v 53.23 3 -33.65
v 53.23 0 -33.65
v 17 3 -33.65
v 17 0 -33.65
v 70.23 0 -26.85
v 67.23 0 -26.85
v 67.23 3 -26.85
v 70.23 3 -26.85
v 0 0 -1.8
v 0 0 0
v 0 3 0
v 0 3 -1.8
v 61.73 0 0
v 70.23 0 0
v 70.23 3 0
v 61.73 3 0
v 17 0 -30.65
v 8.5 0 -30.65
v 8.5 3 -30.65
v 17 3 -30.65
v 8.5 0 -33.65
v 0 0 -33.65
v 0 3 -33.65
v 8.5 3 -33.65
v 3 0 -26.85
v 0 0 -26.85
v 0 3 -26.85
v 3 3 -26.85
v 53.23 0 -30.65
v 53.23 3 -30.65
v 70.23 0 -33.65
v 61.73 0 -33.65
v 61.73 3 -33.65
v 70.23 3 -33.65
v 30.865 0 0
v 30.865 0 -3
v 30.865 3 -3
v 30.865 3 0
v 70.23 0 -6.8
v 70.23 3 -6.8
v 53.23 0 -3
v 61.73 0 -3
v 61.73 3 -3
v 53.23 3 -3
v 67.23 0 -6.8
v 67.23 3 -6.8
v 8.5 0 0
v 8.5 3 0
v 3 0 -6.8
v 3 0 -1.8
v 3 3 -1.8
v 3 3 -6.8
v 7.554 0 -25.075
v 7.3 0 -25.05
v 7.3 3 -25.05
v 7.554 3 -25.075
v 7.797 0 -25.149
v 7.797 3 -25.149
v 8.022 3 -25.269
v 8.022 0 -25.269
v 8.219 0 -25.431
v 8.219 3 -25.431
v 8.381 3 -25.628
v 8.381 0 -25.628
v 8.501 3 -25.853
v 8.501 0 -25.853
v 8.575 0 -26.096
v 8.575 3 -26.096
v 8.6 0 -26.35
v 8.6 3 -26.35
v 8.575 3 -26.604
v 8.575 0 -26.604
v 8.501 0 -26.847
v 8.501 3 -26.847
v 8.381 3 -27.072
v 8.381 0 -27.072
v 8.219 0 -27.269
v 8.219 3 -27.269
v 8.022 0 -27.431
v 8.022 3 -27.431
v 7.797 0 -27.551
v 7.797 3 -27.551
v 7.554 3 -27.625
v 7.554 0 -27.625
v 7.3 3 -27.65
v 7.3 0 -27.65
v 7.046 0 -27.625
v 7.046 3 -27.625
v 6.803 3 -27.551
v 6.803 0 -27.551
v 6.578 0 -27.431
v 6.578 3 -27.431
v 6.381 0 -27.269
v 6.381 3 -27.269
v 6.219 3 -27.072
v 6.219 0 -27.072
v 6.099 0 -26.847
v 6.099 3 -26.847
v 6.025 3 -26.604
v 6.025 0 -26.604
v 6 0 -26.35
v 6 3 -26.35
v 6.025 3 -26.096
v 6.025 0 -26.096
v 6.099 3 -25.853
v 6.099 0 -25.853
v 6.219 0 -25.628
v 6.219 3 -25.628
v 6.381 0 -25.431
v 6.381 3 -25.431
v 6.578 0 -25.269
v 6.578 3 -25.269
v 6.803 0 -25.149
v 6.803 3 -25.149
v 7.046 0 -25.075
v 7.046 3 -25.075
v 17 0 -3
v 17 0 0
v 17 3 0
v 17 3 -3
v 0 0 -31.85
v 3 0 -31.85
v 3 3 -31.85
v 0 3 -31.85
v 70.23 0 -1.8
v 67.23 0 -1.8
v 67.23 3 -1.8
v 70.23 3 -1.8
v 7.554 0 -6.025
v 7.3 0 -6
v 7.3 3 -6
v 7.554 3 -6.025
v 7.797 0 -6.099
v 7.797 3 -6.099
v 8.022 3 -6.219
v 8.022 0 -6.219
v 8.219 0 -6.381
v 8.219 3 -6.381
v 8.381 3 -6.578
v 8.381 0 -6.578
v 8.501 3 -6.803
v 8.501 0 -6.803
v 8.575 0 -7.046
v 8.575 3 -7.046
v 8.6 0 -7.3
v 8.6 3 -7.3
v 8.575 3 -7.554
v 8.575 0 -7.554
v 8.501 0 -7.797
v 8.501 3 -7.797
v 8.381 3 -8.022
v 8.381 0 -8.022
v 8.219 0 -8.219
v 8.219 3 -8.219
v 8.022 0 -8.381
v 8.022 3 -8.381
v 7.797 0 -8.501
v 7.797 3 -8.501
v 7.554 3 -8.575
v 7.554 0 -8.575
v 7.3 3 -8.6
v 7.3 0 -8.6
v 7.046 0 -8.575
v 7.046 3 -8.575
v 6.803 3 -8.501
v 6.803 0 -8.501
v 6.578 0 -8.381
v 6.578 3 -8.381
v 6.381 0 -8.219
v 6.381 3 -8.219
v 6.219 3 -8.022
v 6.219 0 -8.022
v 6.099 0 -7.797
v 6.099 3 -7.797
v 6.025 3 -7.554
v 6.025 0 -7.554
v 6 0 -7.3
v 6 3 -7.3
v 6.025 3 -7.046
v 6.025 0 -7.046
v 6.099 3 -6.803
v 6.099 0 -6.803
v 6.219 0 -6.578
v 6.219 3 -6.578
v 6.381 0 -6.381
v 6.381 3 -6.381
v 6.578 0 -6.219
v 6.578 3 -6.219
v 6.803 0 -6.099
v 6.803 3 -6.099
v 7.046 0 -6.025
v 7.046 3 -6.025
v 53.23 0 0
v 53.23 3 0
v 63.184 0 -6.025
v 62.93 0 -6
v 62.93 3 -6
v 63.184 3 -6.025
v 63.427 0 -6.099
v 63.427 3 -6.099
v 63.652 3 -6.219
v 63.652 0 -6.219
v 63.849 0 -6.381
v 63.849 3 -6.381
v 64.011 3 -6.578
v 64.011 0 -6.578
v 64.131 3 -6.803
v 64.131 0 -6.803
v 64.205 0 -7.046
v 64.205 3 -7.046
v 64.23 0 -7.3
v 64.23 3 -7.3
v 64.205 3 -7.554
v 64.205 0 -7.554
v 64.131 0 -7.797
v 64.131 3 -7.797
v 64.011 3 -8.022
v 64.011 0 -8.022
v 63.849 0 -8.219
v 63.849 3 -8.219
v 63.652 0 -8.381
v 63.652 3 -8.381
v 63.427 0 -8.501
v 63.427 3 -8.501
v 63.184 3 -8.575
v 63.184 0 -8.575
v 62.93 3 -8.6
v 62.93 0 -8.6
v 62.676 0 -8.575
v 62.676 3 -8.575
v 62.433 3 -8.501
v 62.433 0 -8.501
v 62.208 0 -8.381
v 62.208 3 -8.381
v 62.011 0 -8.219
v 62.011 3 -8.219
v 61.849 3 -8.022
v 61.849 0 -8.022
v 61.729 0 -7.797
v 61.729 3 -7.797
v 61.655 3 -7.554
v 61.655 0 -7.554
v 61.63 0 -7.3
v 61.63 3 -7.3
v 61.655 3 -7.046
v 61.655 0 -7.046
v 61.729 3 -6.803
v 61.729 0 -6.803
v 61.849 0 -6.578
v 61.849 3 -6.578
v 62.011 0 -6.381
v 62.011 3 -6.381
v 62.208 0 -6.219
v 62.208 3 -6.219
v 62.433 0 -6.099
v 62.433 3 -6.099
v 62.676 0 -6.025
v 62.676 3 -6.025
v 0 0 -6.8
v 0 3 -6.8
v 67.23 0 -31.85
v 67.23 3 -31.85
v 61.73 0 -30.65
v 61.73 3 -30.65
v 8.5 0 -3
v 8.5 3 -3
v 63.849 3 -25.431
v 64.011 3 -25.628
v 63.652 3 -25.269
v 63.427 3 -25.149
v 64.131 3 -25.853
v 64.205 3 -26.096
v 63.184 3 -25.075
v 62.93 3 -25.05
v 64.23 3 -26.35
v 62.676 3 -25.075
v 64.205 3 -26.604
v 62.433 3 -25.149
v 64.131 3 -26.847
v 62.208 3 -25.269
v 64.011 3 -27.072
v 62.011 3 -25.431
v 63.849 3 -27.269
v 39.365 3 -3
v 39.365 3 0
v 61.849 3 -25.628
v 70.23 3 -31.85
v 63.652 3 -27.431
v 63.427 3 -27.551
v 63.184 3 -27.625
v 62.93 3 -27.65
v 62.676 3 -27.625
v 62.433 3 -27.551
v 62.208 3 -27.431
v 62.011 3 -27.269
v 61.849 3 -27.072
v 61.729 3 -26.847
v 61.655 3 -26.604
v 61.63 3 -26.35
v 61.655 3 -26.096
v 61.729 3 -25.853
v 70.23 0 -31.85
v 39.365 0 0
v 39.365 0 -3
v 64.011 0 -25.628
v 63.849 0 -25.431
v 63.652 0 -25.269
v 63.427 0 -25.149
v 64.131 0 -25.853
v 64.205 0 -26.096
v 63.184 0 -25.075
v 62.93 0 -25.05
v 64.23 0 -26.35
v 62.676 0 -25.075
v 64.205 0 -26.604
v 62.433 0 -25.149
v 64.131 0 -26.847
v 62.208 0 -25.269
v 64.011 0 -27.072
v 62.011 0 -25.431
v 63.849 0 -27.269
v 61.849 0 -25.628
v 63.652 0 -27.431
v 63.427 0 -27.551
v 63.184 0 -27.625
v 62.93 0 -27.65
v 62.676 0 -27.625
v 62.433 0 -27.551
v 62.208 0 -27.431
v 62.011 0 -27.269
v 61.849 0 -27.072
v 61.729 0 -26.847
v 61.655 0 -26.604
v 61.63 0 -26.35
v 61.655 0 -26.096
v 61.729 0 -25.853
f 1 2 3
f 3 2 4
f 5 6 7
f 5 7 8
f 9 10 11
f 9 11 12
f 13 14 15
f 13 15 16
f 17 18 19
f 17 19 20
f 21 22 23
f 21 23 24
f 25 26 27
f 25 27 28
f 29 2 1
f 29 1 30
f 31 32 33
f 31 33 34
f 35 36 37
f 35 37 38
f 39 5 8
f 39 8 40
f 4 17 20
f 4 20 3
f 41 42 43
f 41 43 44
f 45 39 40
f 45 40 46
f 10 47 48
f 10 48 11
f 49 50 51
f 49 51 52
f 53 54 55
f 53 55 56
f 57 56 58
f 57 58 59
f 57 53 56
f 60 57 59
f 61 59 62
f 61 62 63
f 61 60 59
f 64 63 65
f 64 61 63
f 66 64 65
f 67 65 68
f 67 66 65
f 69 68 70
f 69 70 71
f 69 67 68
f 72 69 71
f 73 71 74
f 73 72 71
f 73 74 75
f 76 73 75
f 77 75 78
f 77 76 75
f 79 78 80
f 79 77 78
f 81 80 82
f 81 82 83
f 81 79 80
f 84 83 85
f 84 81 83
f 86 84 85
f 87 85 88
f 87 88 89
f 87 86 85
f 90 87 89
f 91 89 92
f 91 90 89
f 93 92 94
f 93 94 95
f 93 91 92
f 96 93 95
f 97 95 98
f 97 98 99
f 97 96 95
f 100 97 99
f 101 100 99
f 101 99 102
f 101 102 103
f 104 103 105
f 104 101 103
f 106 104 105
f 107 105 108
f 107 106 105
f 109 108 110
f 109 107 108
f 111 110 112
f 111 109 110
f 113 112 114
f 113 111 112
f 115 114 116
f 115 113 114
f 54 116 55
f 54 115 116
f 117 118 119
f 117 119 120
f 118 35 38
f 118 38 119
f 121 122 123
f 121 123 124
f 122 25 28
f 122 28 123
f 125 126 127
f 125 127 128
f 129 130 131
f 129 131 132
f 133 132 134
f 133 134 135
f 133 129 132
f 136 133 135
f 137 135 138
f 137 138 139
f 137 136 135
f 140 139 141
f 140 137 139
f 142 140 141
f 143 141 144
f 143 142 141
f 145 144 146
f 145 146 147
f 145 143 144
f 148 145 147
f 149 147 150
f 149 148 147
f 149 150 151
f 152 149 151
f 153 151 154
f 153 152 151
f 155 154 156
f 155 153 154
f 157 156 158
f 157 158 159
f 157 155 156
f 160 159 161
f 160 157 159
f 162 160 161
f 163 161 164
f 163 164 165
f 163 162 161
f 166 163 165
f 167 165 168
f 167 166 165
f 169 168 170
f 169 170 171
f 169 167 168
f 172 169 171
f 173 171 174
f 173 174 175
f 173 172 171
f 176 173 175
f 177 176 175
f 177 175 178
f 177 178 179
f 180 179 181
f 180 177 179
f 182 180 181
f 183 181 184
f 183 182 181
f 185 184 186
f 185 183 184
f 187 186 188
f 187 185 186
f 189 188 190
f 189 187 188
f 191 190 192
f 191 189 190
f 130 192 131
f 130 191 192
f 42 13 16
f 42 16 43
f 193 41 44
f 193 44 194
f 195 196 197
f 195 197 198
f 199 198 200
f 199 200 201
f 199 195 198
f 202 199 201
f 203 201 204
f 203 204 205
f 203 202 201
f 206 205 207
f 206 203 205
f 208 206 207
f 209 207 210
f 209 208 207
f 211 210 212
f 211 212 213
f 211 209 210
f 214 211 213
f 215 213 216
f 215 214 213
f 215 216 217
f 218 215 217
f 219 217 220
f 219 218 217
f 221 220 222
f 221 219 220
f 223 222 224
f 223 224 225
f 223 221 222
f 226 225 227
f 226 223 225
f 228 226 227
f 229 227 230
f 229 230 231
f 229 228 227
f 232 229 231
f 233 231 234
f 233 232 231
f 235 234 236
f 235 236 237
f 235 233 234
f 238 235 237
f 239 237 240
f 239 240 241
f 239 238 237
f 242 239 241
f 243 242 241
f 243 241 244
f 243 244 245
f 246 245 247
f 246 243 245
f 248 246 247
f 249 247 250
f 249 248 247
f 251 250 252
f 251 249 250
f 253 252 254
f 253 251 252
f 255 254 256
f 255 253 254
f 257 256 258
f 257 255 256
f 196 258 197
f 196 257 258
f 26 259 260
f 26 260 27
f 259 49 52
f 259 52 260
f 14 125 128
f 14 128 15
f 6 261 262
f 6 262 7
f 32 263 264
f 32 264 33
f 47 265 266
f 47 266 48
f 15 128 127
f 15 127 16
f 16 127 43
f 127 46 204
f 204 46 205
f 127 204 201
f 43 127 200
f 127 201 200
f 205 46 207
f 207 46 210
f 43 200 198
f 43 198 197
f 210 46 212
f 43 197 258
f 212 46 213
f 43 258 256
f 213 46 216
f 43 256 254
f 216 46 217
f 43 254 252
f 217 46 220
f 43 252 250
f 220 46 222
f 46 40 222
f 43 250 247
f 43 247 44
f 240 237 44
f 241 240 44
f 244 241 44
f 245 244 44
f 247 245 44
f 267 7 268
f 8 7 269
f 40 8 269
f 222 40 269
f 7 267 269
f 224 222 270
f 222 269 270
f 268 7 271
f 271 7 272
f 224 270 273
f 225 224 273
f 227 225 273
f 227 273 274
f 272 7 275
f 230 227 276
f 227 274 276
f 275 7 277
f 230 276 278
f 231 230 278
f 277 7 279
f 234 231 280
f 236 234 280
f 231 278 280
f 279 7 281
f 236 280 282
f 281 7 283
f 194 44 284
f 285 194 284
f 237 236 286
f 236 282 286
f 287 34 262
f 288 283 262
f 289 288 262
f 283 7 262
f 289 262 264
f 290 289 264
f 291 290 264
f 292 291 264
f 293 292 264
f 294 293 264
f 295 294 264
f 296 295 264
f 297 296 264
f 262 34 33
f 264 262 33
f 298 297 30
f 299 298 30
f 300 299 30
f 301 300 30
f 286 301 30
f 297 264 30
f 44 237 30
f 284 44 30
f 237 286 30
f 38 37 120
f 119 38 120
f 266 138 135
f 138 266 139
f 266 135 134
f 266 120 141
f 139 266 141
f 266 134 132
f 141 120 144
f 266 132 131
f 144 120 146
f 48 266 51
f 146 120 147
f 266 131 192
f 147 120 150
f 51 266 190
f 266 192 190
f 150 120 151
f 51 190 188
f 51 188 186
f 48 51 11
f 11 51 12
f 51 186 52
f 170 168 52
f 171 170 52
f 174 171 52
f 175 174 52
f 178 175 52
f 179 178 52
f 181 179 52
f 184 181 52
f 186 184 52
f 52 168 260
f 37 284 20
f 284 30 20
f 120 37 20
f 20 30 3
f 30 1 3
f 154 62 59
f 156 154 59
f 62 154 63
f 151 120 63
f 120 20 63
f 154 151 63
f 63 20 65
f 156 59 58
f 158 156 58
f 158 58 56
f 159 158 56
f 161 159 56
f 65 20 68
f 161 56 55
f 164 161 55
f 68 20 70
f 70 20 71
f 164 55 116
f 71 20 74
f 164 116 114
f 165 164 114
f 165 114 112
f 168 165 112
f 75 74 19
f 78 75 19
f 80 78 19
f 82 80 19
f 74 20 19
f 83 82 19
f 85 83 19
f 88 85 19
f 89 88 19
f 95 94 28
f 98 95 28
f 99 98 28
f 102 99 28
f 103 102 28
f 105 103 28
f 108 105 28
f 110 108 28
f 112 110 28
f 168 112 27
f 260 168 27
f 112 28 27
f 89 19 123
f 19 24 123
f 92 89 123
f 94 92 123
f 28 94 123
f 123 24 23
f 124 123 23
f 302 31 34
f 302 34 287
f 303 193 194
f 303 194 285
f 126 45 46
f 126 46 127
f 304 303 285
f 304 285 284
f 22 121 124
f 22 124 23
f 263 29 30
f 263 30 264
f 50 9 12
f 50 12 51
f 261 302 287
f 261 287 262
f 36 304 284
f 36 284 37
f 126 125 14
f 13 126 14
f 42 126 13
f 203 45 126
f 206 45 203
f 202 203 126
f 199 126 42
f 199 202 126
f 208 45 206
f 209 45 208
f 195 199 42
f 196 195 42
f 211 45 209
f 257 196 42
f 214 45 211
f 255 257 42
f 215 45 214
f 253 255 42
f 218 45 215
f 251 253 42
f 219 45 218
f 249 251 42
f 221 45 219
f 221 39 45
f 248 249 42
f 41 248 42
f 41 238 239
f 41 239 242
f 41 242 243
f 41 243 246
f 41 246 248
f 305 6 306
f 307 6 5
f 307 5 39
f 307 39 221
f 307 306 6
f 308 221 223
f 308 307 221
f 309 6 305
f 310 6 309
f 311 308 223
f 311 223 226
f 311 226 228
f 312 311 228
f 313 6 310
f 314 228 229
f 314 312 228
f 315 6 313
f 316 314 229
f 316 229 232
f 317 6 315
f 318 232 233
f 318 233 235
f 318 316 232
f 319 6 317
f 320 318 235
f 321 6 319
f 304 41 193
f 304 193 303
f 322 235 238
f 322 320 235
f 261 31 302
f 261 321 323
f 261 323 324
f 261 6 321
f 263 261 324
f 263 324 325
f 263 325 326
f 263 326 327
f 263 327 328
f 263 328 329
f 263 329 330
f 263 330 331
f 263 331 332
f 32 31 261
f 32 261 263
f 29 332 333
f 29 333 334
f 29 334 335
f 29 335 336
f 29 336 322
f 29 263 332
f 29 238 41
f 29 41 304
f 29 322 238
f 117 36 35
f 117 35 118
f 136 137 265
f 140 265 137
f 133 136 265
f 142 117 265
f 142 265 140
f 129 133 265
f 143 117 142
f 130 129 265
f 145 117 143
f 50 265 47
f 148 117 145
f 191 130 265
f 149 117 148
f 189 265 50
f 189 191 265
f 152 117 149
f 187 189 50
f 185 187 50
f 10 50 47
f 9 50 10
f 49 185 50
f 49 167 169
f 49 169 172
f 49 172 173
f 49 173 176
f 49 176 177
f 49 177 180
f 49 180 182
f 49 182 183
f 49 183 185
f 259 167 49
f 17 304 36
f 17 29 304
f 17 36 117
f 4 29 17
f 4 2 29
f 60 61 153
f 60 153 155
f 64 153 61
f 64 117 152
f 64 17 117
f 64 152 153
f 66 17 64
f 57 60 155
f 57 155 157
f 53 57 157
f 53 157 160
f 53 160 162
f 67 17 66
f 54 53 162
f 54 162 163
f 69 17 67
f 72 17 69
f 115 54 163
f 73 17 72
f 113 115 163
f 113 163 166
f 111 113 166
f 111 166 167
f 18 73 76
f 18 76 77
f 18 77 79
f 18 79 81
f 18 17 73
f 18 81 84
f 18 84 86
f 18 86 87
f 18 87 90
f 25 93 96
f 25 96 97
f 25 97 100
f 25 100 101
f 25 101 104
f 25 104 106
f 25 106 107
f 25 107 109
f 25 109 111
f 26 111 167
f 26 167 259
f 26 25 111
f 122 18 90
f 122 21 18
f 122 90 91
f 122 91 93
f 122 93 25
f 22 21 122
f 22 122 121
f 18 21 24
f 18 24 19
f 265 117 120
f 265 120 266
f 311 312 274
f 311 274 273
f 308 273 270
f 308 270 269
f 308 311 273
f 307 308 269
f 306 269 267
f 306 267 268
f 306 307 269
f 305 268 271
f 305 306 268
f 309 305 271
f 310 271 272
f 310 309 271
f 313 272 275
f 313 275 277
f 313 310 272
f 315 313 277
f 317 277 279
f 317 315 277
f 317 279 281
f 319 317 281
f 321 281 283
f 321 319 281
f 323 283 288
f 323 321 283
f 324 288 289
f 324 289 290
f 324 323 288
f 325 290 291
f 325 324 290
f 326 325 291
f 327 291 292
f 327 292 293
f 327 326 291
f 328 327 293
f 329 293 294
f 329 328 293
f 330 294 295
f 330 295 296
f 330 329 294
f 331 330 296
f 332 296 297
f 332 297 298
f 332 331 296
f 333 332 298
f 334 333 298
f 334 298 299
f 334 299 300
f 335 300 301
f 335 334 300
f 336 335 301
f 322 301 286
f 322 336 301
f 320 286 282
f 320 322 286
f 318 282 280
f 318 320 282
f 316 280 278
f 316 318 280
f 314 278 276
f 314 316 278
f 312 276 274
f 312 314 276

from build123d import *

# Parameters (mm, degrees)
CROQUIS1_R              = 1.3
SALIENTE_EXTRUIR1_DEPTH = 3


with BuildPart() as part:
    # Croquis1 → Saliente-Extruir1 (new body)
    with BuildSketch(Plane(origin=(0, 0, 0), x_dir=(1, 0, 0), z_dir=(0, 1, 0))):
        Polygon((17, 33.65), (30.865, 33.65), (39.365, 33.65), (53.23, 33.65), (53.23, 30.65), (61.73, 30.65), (61.73, 33.65), (70.23, 33.65), (70.23, 31.85), (67.23, 31.85), (67.23, 26.85), (70.23, 26.85), (70.23, 6.8), (67.23, 6.8), (67.23, 1.8), (70.23, 1.8), (70.23, 0), (61.73, 0), (61.73, 3), (53.23, 3), (53.23, 0), (39.365, 0), (39.365, 3), (30.865, 3), (30.865, 0), (17, 0), (17, 3), (8.5, 3), (8.5, 0), (0, 0), (0, 1.8), (3, 1.8), (3, 6.8), (0, 6.8), (0, 26.85), (3, 26.85), (3, 31.85), (0, 31.85), (0, 33.65), (8.5, 33.65), (8.5, 30.65), (17, 30.65), align=None)
        with Locations(Location((7.3, 26.35, 0), (0, 0, 270))):
            Circle(CROQUIS1_R, mode=Mode.SUBTRACT)
        with Locations(Location((7.3, 7.3, 0), (0, 0, 270))):
            Circle(CROQUIS1_R, mode=Mode.SUBTRACT)
        with Locations(Location((62.93, 26.35, 0), (0, 0, 270))):
            Circle(CROQUIS1_R, mode=Mode.SUBTRACT)
        with Locations(Location((62.93, 7.3, 0), (0, 0, 270))):
            Circle(CROQUIS1_R, mode=Mode.SUBTRACT)
    extrude(amount=SALIENTE_EXTRUIR1_DEPTH)


solid = part.part
